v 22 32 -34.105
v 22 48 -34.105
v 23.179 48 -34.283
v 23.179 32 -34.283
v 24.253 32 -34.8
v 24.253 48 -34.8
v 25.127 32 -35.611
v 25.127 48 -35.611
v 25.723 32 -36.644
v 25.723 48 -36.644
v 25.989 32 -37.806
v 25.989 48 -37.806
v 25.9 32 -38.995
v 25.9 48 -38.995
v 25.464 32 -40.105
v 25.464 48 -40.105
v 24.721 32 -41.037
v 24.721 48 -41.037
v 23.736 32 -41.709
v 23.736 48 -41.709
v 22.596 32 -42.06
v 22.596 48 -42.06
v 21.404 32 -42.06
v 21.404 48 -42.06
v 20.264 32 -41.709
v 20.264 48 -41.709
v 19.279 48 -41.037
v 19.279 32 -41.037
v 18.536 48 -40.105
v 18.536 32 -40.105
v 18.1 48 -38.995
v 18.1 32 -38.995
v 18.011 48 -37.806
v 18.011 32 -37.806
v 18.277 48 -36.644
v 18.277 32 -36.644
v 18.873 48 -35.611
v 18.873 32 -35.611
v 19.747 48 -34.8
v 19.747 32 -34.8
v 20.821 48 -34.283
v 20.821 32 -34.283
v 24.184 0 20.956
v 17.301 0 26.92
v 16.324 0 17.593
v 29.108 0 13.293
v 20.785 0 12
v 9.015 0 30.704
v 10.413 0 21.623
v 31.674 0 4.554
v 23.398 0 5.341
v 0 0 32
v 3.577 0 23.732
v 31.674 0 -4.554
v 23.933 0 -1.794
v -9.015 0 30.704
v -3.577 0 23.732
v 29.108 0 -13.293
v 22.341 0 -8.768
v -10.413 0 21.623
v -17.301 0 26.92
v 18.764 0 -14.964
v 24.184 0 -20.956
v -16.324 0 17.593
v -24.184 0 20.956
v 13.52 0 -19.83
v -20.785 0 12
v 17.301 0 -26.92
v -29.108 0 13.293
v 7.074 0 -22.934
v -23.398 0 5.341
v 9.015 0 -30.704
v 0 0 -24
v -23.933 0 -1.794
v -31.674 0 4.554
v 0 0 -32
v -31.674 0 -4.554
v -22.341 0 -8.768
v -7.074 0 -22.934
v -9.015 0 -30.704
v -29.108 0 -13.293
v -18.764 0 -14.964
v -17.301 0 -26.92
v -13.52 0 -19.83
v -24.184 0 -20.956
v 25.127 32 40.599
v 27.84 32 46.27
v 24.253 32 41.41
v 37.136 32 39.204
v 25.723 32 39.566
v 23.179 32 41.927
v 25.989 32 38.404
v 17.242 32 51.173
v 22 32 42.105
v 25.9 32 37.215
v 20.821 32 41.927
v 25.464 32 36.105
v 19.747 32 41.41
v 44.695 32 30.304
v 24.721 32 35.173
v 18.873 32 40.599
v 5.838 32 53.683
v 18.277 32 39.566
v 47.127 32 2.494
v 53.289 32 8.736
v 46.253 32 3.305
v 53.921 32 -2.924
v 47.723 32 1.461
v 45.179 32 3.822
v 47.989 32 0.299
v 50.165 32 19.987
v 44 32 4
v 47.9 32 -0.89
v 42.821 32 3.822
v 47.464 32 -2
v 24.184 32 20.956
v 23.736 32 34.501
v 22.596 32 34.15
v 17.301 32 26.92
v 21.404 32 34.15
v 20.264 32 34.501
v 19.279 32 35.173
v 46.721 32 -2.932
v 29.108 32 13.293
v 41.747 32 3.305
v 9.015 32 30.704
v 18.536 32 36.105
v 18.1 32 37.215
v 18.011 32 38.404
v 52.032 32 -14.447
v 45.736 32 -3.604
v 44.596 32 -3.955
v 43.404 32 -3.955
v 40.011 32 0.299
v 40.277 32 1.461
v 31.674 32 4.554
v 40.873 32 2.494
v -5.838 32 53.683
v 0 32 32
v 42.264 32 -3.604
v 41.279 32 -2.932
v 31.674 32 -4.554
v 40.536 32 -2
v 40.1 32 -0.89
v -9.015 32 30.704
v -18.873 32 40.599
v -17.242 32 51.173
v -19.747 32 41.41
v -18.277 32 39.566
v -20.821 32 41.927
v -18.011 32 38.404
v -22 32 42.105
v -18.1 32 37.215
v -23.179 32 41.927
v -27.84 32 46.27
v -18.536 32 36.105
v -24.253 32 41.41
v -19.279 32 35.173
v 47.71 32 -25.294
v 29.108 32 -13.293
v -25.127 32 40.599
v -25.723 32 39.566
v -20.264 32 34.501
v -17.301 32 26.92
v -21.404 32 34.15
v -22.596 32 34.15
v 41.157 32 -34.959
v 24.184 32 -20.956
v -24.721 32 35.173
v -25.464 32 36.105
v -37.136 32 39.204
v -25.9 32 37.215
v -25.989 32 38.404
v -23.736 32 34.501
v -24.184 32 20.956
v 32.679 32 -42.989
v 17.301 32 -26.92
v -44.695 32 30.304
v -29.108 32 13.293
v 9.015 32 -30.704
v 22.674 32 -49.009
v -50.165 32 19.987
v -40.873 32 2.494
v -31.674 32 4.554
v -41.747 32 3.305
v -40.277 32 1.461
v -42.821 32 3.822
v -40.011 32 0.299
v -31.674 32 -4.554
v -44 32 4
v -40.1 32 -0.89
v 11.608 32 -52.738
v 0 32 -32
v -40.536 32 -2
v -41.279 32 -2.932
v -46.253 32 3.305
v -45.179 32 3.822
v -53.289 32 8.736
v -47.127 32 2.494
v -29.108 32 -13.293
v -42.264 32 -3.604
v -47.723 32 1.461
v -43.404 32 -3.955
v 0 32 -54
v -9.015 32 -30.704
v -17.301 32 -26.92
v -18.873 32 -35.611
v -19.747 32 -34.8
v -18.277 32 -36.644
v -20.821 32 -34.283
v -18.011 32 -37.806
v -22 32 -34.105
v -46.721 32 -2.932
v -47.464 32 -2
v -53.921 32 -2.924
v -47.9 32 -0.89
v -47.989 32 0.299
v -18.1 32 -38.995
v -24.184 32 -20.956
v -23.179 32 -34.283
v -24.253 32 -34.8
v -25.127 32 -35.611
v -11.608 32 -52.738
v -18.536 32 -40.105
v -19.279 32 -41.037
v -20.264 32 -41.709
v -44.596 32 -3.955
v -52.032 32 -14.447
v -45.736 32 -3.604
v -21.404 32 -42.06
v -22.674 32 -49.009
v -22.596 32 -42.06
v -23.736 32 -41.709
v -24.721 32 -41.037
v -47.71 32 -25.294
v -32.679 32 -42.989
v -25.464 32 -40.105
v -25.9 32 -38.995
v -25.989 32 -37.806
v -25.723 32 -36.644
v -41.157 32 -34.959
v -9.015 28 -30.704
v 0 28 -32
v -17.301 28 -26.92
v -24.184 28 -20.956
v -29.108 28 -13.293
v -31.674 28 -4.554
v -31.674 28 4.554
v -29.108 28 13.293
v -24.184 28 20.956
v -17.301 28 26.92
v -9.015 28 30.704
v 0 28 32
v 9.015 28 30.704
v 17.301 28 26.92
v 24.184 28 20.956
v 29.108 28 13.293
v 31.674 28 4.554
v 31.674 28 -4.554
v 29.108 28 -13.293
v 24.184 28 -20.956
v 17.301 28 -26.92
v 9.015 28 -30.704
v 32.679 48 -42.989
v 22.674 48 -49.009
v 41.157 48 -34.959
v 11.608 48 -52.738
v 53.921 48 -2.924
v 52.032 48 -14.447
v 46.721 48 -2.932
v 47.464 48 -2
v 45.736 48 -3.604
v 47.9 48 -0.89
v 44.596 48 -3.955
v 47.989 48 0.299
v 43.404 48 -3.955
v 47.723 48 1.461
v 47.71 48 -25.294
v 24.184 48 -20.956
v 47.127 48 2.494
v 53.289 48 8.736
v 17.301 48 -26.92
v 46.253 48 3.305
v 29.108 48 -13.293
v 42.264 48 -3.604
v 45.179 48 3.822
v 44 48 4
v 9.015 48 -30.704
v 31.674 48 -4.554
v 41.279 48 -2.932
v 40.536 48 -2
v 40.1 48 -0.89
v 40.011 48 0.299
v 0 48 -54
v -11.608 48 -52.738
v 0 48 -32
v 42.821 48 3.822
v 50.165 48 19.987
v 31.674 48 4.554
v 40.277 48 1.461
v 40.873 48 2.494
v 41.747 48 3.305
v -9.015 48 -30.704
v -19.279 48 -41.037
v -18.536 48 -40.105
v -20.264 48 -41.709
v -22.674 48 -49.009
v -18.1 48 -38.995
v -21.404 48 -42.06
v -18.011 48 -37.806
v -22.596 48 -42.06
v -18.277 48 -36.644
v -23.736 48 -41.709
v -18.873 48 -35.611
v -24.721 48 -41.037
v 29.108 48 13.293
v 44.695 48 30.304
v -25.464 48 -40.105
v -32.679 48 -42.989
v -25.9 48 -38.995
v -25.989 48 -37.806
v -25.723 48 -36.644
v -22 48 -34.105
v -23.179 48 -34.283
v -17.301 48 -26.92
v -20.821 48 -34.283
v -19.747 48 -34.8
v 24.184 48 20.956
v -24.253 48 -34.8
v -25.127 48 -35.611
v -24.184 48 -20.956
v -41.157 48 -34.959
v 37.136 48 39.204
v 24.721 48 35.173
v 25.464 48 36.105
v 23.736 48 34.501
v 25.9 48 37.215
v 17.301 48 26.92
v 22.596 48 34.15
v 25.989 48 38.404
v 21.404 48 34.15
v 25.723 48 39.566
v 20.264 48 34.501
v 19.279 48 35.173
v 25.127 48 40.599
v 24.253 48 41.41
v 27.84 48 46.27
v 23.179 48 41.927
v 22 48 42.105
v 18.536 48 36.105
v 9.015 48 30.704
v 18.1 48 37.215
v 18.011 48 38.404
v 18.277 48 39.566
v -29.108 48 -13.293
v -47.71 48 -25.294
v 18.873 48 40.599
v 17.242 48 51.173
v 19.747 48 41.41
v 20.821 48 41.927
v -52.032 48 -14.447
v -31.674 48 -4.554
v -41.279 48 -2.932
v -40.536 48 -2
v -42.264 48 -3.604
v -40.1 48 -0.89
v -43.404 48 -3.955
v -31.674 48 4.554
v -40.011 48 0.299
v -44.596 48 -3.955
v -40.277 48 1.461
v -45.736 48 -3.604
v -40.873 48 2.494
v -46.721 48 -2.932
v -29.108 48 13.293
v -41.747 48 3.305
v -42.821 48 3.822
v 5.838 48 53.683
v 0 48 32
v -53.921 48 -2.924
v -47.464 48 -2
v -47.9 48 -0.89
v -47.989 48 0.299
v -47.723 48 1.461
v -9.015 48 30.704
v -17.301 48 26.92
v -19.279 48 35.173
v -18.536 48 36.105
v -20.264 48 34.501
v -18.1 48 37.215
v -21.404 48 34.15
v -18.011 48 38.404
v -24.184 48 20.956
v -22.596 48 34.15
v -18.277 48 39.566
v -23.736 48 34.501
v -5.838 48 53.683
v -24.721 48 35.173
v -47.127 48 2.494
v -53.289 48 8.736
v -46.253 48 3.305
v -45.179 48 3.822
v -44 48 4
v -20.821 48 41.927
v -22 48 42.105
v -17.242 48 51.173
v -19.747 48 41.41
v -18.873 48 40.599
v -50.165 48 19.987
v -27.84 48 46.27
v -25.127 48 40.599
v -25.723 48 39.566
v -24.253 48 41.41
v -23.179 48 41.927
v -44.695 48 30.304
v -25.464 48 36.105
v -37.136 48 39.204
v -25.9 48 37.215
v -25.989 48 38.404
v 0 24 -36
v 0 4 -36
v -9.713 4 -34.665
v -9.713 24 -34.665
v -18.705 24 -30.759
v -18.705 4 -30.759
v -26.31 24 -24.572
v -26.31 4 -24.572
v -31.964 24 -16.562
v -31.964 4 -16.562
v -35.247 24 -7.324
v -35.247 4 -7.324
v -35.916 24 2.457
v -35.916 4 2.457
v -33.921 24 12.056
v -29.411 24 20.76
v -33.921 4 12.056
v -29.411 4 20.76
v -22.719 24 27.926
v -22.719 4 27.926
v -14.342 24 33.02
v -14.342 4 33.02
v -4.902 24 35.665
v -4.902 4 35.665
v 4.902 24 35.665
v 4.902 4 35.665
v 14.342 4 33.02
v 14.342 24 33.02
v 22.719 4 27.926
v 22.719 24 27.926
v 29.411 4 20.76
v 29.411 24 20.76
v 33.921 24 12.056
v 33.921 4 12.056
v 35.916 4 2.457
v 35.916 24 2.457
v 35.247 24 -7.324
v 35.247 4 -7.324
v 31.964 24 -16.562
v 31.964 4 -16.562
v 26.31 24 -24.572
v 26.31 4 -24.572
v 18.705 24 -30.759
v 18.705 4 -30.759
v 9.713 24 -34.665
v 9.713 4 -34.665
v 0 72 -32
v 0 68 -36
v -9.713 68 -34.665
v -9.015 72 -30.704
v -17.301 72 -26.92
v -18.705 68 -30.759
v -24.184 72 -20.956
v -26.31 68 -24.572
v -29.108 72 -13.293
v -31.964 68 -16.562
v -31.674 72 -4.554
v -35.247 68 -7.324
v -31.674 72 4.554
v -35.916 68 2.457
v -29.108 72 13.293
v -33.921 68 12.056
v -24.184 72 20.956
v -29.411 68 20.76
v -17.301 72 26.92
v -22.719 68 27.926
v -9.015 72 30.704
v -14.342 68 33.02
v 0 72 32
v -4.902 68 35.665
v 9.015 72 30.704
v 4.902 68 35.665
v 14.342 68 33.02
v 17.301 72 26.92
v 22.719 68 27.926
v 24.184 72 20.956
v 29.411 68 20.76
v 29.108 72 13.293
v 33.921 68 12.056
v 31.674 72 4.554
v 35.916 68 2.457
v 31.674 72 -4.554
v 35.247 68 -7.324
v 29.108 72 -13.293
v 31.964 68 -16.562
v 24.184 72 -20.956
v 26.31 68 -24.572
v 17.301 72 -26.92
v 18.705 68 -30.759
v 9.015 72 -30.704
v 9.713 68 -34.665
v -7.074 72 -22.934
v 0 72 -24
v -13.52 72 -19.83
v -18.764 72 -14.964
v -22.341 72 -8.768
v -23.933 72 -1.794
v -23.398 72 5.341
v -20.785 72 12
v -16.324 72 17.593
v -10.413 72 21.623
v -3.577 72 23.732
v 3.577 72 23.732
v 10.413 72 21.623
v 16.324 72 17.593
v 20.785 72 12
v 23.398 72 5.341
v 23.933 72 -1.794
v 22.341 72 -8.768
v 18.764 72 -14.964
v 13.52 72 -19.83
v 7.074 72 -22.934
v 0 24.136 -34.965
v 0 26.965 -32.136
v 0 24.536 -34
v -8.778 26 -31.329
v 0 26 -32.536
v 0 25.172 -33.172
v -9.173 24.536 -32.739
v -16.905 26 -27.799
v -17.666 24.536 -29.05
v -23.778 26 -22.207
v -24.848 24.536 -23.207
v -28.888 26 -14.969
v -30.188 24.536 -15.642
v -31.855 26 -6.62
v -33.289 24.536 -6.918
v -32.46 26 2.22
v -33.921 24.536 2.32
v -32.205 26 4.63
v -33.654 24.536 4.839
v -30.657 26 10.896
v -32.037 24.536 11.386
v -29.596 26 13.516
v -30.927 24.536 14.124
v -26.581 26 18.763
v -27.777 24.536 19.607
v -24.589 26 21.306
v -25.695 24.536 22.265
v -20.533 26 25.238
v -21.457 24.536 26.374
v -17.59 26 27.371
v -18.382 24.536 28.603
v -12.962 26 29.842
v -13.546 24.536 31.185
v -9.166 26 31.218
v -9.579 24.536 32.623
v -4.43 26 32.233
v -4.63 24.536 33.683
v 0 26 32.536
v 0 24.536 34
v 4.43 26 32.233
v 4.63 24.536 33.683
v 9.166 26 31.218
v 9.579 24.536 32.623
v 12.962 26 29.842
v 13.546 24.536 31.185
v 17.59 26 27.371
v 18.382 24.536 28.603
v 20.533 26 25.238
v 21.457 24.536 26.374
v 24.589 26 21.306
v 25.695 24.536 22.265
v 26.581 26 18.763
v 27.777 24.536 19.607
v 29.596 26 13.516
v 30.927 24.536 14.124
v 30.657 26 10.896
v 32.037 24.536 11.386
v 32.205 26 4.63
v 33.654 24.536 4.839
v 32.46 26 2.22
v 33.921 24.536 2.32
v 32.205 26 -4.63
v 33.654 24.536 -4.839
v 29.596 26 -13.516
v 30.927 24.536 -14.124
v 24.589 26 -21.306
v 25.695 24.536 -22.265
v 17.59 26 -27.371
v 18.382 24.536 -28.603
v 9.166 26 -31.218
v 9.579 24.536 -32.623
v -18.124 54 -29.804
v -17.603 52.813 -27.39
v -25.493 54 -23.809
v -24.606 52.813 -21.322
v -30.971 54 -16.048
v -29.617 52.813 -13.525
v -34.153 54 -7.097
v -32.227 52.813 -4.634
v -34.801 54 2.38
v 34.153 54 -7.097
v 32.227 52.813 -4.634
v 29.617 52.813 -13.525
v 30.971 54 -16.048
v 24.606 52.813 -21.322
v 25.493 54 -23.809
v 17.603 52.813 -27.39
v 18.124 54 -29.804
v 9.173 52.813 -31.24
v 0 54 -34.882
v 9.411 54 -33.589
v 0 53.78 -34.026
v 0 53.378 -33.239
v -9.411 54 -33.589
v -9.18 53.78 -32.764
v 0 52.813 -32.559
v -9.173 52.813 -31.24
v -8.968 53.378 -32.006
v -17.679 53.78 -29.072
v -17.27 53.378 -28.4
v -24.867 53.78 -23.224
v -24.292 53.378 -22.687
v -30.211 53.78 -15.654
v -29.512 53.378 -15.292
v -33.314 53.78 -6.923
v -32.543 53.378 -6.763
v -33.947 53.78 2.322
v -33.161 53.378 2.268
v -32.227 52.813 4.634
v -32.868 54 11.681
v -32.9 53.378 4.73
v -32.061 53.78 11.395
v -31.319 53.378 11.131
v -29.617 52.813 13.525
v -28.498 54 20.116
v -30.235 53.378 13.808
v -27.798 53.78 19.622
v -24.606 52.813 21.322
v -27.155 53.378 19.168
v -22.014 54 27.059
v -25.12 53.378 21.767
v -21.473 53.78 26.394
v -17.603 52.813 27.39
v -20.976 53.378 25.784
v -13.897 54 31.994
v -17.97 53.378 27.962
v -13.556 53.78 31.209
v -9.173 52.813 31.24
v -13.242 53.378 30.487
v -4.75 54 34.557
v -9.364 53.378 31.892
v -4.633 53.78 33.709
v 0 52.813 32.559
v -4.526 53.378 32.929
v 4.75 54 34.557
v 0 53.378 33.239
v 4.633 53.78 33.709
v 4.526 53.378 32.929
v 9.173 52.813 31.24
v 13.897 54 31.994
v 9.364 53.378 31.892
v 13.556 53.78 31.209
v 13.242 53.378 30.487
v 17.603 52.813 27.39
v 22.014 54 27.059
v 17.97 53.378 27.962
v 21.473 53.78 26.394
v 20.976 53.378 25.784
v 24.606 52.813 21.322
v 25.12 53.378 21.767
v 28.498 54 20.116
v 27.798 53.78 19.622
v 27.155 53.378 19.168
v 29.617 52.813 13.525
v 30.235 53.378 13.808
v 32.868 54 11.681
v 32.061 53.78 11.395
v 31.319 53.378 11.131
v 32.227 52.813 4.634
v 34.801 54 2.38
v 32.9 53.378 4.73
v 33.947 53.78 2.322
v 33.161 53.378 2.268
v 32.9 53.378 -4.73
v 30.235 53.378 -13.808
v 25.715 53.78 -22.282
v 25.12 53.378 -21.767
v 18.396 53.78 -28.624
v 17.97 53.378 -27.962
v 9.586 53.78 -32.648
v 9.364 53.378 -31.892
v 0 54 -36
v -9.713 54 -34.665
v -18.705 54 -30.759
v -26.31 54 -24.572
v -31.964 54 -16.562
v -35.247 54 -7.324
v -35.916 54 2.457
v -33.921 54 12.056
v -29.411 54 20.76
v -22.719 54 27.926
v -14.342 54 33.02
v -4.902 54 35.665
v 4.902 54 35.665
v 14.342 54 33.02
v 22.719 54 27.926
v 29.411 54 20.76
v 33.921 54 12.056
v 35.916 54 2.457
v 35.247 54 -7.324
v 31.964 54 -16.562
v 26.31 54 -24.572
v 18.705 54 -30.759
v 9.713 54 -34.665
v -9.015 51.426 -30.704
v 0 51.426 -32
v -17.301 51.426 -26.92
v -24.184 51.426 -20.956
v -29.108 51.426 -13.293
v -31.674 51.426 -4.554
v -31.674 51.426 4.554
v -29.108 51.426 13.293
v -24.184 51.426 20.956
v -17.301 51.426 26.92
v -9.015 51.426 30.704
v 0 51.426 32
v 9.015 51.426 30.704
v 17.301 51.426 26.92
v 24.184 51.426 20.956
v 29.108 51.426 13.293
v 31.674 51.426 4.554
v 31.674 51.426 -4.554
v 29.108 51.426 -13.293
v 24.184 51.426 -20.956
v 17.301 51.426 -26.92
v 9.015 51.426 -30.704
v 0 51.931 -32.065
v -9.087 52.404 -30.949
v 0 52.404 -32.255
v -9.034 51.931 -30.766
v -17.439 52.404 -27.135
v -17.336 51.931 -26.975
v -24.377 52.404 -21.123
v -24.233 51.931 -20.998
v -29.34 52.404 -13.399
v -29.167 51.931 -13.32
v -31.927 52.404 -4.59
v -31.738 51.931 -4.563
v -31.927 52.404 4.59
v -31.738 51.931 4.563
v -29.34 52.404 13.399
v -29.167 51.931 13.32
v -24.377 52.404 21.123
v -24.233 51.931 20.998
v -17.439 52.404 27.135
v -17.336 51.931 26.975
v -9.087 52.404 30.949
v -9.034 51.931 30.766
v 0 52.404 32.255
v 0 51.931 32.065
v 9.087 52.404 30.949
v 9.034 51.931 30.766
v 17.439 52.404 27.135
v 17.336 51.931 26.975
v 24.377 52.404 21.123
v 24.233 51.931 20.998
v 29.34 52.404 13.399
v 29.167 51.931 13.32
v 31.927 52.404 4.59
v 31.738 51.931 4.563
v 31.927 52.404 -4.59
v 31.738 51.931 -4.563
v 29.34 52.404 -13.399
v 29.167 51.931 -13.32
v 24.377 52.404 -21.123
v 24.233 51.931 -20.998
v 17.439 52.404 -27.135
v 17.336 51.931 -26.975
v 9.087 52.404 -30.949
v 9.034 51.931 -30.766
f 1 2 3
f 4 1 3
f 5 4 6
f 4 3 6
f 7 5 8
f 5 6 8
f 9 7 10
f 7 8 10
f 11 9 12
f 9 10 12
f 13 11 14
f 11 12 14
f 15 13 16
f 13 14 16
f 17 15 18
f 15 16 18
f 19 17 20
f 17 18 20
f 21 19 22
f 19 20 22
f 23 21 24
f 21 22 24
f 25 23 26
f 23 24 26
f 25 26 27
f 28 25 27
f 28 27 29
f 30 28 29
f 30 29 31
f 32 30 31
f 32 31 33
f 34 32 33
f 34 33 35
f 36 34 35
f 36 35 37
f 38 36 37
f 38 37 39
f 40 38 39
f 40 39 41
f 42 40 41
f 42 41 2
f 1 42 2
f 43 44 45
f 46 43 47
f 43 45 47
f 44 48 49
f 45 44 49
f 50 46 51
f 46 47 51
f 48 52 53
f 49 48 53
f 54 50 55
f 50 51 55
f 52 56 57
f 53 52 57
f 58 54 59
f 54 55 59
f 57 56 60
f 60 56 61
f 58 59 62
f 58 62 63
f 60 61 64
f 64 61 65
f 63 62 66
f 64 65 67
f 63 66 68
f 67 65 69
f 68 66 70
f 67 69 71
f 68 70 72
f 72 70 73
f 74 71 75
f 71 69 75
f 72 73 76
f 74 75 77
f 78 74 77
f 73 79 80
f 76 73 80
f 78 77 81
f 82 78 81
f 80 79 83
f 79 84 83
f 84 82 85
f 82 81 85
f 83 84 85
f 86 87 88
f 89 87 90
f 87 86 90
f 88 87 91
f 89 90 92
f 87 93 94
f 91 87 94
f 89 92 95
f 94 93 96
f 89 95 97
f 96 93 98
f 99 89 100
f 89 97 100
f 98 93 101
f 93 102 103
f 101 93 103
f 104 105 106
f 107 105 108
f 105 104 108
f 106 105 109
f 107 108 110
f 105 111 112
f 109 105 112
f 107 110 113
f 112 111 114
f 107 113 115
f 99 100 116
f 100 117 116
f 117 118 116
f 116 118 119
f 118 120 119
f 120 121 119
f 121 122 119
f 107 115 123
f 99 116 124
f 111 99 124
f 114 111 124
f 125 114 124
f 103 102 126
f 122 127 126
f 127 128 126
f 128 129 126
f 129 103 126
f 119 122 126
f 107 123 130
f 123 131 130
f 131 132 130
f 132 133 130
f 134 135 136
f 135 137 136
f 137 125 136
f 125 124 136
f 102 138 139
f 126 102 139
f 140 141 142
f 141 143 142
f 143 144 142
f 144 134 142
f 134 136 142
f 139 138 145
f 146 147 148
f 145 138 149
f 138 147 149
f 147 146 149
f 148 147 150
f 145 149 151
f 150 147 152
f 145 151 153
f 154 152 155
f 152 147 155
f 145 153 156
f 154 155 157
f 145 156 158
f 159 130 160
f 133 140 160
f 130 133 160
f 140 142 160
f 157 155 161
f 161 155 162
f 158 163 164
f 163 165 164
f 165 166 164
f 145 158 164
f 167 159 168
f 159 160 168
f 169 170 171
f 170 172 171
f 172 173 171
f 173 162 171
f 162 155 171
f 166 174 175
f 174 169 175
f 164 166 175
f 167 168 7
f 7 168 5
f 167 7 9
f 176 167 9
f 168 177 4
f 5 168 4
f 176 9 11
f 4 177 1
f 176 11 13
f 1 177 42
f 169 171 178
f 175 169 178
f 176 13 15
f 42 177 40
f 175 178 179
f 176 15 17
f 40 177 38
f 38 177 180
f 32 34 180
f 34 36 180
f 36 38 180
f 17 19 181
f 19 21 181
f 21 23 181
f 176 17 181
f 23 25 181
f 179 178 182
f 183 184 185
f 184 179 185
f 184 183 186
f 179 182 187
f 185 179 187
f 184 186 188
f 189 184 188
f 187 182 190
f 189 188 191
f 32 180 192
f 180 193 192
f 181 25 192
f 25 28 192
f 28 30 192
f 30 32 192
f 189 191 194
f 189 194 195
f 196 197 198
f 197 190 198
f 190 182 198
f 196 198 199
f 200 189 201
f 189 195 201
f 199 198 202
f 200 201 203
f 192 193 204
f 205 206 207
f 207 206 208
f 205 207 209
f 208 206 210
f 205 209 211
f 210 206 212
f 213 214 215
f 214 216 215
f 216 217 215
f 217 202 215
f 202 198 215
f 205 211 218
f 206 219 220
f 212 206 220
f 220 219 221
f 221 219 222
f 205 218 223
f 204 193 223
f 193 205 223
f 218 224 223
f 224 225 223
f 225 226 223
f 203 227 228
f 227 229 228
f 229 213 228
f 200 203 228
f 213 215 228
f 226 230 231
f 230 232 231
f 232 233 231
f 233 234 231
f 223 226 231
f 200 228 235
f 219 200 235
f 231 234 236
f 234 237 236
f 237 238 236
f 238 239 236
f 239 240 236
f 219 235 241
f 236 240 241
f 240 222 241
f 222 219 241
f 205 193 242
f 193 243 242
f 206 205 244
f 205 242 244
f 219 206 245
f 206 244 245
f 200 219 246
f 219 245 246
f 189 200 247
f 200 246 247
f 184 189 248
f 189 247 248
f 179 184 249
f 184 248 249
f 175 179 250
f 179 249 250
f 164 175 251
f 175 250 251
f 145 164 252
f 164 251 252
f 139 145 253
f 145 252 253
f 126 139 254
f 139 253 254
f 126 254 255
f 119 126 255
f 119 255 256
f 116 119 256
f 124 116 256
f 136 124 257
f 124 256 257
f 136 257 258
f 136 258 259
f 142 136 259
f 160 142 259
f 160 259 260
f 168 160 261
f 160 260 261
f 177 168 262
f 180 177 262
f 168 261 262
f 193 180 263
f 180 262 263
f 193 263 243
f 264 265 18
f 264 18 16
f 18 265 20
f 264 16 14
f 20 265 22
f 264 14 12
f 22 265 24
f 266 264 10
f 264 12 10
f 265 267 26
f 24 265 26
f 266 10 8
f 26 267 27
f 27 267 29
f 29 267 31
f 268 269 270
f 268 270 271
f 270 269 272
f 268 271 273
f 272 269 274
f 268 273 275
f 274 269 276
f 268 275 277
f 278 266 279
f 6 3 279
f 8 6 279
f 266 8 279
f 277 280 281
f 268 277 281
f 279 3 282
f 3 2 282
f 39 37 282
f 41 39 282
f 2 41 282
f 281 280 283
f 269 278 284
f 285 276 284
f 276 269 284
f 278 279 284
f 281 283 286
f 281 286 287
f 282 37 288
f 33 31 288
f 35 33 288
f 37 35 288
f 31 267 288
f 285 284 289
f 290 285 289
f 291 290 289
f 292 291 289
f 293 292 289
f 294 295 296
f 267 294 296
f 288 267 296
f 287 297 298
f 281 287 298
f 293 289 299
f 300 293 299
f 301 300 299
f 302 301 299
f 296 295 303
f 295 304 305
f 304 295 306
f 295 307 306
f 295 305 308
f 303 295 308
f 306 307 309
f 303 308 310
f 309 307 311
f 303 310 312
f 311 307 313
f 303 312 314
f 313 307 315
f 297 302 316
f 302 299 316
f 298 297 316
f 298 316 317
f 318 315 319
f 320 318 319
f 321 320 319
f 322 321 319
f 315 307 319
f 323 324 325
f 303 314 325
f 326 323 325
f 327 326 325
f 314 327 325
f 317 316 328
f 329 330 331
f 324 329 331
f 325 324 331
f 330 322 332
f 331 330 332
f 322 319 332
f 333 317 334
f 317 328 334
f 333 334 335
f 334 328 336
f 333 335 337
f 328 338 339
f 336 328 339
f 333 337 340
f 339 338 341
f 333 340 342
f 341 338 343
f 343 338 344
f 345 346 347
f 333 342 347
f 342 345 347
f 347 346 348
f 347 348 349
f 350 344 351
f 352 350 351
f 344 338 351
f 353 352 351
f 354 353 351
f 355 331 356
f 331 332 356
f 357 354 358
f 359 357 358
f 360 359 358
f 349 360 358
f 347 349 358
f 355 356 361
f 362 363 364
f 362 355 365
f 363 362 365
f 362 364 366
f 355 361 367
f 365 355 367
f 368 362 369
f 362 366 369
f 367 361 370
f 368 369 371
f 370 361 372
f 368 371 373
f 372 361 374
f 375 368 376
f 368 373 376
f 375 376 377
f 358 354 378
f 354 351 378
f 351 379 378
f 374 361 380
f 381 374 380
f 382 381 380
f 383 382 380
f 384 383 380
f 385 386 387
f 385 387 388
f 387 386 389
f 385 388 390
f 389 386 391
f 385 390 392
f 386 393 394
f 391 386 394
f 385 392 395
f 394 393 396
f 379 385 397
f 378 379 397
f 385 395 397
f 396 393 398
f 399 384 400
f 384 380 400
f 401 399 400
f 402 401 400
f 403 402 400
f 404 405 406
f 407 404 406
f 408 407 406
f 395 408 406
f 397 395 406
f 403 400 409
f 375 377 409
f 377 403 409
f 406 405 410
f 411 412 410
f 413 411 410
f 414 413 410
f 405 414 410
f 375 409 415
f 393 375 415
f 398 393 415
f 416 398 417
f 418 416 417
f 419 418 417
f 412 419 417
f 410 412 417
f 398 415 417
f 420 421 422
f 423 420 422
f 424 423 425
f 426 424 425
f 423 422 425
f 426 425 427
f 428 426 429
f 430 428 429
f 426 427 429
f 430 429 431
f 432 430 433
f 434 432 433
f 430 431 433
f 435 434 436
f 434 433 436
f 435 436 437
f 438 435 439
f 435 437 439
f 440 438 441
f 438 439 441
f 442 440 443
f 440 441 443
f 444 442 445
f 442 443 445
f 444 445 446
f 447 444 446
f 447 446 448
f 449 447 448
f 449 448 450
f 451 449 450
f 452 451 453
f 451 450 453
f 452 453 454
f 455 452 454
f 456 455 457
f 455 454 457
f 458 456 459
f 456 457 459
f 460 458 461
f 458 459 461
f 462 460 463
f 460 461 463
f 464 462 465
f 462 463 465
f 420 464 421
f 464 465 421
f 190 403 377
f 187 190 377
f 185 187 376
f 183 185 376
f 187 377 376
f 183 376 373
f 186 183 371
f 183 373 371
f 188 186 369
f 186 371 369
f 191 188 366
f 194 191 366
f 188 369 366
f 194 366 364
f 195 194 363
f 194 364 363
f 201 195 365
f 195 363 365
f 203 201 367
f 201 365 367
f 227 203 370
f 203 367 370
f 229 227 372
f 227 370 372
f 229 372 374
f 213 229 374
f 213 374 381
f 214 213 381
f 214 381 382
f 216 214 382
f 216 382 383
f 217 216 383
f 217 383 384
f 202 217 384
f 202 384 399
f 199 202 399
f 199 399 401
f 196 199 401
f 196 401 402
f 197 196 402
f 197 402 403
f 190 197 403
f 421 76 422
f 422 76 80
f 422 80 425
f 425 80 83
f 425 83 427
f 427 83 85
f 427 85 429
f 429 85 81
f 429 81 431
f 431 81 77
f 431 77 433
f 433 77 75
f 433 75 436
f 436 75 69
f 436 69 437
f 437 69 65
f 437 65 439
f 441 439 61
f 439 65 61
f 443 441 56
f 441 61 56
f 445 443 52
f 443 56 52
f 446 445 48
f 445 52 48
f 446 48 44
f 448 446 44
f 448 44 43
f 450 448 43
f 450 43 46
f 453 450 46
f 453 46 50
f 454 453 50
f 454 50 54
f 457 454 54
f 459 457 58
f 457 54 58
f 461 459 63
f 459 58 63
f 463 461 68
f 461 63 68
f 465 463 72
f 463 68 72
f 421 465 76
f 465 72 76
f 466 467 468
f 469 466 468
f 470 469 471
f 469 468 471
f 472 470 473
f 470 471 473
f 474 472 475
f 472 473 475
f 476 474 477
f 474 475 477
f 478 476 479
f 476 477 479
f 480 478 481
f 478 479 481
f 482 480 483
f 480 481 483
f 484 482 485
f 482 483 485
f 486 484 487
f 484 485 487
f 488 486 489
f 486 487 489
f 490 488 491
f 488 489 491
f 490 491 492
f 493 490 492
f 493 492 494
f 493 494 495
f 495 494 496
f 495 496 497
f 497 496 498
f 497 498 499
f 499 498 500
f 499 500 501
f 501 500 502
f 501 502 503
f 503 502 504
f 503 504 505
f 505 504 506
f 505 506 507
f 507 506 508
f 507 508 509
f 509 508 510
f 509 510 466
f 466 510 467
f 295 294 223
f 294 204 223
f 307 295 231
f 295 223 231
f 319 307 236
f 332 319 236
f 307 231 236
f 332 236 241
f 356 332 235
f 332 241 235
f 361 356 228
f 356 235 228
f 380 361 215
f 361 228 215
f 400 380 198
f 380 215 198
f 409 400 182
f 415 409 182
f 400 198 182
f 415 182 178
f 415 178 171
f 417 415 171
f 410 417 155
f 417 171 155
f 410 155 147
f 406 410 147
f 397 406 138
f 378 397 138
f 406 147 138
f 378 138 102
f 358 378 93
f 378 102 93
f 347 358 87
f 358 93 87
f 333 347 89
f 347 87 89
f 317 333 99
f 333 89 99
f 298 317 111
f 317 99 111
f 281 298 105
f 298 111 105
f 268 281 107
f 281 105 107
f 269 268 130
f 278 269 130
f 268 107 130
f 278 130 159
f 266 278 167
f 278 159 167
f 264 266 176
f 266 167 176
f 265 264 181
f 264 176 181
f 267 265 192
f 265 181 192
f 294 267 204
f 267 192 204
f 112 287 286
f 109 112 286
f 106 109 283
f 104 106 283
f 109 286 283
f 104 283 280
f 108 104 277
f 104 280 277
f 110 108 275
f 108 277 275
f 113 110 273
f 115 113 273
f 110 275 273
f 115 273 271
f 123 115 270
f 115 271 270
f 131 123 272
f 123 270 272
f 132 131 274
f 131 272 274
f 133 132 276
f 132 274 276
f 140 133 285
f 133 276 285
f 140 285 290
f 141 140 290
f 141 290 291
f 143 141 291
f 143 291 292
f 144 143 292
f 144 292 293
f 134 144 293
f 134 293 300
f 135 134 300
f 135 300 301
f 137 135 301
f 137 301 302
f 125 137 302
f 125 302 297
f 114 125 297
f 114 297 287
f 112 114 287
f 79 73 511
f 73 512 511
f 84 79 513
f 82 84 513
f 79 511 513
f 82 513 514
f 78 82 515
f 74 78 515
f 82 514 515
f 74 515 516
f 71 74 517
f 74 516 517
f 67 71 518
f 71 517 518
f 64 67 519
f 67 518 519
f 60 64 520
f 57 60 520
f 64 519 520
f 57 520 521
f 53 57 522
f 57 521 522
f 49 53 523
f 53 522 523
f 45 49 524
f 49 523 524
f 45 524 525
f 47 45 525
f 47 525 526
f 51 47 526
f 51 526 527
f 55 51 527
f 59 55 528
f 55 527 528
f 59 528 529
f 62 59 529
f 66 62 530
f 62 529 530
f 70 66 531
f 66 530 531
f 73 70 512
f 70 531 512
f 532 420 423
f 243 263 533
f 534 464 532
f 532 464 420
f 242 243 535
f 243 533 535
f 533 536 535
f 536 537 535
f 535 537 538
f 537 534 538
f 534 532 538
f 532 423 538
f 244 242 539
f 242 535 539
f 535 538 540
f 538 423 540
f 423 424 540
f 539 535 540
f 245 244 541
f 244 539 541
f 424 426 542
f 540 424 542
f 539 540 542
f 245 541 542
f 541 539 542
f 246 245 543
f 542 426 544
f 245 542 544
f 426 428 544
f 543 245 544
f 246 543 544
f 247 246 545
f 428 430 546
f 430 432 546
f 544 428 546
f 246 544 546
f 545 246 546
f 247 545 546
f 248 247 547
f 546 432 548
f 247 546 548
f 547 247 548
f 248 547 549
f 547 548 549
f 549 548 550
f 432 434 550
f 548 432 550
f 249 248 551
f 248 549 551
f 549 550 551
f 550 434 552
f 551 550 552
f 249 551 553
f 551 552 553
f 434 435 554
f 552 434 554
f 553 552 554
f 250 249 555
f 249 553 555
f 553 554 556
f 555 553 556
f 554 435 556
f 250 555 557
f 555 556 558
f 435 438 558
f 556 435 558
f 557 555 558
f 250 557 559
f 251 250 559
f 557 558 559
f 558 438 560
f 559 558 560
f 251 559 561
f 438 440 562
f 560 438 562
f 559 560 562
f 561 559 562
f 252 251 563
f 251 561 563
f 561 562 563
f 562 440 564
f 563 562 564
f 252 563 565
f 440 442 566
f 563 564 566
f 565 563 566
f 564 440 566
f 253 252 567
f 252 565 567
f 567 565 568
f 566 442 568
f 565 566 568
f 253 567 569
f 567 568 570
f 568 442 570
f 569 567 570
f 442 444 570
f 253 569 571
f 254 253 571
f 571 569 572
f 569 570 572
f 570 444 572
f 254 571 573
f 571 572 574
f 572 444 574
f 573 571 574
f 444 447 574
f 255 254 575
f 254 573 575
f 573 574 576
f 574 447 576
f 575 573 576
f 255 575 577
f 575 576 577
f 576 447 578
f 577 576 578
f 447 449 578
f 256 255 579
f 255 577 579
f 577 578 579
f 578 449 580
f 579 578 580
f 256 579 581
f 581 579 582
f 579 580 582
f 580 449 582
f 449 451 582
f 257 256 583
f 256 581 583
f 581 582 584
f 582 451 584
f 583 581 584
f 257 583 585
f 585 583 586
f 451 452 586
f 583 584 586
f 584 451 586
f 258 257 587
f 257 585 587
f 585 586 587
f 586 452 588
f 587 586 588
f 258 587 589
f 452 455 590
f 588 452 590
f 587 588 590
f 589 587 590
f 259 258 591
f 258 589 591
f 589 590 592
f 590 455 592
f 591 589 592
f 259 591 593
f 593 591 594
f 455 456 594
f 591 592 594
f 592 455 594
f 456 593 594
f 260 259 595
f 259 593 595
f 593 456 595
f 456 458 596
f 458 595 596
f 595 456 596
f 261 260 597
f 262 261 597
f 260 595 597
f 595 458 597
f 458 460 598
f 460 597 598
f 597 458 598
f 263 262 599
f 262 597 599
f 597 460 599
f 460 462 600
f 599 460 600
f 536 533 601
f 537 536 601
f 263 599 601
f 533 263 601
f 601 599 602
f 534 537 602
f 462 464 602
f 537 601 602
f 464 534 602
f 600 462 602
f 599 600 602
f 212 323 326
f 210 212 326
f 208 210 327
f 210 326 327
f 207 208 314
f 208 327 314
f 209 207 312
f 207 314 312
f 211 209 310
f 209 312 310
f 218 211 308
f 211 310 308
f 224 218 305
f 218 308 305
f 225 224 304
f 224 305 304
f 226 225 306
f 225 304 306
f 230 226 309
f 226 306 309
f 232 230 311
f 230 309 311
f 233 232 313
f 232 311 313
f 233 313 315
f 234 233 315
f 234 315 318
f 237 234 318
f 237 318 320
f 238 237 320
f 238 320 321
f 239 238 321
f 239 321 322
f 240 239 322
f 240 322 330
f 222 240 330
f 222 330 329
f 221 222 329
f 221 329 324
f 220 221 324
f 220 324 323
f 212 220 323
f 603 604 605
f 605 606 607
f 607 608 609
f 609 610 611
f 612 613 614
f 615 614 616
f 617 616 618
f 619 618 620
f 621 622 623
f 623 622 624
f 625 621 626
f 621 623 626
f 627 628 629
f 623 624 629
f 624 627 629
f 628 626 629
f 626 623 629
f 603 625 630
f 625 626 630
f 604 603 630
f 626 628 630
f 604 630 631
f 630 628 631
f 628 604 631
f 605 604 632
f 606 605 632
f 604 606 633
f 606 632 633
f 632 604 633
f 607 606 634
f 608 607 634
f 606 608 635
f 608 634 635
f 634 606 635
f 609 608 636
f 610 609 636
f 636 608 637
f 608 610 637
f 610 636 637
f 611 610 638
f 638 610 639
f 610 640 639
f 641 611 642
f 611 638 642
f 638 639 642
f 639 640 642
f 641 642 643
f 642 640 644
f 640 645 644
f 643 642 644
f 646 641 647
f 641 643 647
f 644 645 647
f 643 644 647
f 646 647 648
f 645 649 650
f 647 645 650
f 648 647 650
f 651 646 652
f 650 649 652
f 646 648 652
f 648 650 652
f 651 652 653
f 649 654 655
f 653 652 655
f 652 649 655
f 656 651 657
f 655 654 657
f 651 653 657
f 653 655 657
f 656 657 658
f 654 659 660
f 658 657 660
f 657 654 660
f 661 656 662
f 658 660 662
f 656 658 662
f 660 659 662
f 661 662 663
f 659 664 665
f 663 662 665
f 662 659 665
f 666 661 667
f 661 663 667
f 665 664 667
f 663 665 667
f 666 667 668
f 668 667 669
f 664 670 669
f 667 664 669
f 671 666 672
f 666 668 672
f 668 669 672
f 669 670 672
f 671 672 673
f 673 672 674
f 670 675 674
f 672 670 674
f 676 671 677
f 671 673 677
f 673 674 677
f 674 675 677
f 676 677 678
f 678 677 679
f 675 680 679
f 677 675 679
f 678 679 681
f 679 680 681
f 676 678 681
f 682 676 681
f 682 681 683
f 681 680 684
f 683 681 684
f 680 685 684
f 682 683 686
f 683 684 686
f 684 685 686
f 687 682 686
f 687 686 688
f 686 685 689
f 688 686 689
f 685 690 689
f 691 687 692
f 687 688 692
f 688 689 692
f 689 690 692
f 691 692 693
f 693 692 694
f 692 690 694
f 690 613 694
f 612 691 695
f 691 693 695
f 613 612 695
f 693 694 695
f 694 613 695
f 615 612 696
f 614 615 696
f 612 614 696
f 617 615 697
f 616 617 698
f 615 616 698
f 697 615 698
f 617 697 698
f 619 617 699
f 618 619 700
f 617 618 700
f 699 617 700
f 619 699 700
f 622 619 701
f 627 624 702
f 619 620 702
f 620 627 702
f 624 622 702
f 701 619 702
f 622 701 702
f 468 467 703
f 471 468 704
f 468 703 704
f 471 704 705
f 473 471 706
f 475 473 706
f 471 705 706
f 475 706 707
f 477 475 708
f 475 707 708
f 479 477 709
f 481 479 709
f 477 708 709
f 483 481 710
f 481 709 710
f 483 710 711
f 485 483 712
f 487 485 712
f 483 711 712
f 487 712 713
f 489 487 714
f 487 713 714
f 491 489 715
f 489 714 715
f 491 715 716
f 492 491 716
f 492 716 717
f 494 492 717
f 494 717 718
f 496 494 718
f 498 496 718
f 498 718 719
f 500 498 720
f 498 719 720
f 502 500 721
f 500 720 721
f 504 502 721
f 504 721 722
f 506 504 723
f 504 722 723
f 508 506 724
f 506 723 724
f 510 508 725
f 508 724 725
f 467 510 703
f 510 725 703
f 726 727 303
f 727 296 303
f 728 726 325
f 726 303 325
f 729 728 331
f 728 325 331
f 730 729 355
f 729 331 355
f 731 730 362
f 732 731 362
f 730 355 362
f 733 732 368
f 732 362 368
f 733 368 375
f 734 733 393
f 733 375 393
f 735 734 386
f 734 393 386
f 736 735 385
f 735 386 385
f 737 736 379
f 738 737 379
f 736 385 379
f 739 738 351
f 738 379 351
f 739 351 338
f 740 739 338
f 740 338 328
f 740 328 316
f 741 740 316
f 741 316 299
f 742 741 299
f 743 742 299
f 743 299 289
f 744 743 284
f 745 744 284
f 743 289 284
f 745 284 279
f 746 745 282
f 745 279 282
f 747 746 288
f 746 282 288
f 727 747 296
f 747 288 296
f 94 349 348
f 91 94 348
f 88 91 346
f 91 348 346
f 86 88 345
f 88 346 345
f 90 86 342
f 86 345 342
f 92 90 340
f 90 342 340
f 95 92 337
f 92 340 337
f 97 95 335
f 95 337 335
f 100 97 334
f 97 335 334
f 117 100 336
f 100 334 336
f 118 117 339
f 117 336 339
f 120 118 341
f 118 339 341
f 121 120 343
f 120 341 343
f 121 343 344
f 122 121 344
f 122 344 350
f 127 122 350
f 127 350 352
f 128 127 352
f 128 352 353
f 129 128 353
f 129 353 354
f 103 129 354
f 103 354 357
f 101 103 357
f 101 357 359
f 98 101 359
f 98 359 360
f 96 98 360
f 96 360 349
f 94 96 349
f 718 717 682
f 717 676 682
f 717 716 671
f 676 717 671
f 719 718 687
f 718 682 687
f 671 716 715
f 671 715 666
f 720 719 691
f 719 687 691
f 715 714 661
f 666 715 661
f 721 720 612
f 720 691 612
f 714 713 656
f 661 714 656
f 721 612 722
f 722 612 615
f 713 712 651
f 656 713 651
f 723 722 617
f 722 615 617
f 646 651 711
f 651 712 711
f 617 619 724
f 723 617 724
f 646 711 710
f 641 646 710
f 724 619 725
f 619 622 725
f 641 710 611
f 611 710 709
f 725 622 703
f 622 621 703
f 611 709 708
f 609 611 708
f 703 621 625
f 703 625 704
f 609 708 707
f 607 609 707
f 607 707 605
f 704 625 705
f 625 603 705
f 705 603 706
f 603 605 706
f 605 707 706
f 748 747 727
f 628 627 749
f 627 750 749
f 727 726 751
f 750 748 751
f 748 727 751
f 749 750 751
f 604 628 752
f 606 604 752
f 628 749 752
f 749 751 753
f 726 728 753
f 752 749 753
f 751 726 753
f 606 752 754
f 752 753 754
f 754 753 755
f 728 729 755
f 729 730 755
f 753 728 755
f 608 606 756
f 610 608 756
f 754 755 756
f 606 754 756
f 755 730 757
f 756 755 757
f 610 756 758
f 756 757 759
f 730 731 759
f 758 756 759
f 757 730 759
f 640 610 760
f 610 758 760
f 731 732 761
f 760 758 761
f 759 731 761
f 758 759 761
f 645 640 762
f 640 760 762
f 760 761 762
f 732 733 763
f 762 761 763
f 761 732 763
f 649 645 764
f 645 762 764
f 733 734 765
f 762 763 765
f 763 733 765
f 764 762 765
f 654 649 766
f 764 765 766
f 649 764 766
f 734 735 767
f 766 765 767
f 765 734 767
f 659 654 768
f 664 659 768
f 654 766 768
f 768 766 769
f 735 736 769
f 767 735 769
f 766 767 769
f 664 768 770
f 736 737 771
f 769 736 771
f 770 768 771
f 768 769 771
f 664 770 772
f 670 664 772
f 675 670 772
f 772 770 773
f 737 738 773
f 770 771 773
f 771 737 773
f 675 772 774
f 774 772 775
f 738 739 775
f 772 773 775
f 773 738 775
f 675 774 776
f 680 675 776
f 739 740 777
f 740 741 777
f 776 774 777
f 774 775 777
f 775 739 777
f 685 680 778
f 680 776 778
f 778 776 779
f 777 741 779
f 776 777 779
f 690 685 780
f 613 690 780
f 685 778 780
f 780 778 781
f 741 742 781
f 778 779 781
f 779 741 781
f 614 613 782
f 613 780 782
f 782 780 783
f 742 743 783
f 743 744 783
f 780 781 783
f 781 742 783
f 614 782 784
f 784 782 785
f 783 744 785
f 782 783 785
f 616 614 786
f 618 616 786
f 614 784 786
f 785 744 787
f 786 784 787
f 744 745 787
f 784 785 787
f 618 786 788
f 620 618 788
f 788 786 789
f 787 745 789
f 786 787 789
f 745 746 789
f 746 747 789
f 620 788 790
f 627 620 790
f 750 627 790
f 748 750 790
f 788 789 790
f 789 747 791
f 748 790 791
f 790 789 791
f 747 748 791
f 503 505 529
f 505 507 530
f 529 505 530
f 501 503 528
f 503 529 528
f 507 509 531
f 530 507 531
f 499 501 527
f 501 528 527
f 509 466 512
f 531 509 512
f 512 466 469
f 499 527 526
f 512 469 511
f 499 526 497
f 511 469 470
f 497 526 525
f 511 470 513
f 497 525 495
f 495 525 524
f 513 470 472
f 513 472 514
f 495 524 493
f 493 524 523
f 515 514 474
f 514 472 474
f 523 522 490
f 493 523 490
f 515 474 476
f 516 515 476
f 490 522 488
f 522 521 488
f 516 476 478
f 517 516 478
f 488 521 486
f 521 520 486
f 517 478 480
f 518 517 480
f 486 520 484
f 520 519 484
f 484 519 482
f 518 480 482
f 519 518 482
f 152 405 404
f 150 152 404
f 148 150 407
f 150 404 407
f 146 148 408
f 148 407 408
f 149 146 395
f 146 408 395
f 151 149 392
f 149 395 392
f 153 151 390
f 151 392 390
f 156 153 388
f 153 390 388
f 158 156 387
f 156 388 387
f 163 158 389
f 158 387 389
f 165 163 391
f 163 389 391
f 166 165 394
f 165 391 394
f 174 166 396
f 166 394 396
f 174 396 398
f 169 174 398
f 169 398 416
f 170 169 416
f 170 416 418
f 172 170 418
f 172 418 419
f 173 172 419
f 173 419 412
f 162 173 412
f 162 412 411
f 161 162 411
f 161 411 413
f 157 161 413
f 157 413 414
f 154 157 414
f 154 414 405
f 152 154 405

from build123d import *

# Parameters (mm, degrees)
CHAMFER4_SIZE      = 4
CUT_EXTRUDE1_REACH = 92.2
SKETCH3_R          = 4


with BuildPart() as part:
    # Sketch2 → Revolve2 (revolve)
    with BuildSketch(Plane.XY, mode=Mode.PRIVATE) as revolve2_sk:
        with BuildLine():
            Line((-24, 0), (-24, 72))
            Line((-24, 72), (-36, 72))
            Line((-36, 72), (-36, 54))
            Line((-36, 54), (-34.882306768, 54))
            ThreePointArc((-34.882306768, 54), (-33.621047496, 53.601142721), (-32.558846616, 52.812732058))
            ThreePointArc((-32.558846616, 52.812732058), (-32.144965395, 52.173542011), (-32, 51.425981568))
            Line((-32, 51.425981568), (-32, 48))
            Line((-32, 48), (-54, 48))
            Line((-54, 48), (-54, 32))
            Line((-54, 32), (-32, 32))
            Line((-32, 32), (-32, 28))
            ThreePointArc((-32, 28), (-33.171572875, 25.171572875), (-36, 24))
            Line((-36, 24), (-36, 0))
            Line((-36, 0), (-24, 0))
        make_face()
    revolve(revolve2_sk.sketch.rotate(Axis((0, 0, 0), (0, 1, 0)), 270), axis=Axis((0, 0, 0), (0, 1, 0)))

    # Chamfer4
    chamfer4_edges = [part.edges().sort_by_distance(p)[0] for p in [
        (0, 0, 36),
        (0, 72, 36),
    ]]
    chamfer(chamfer4_edges, length=CHAMFER4_SIZE)

    # Sketch3 → Cut-Extrude1 (cut, up to next)
    with BuildSketch(Plane(origin=(0, 48, 0), x_dir=(1, 0, 0), z_dir=(0, 1, 0)), mode=Mode.PRIVATE) as cut_extrude1_sk1:
        with Locations(Location((44, 0, 0), (0, 0, 270))):
            Circle(SKETCH3_R)
    cut_extrude1_tool1 = extrude(cut_extrude1_sk1.sketch, amount=-CUT_EXTRUDE1_REACH, mode=Mode.PRIVATE) & part.part
    # Sketch3 → Cut-Extrude1 (cut, up to next)
    with BuildSketch(Plane(origin=(0, 48, 0), x_dir=(1, 0, 0), z_dir=(0, 1, 0)), mode=Mode.PRIVATE) as cut_extrude1_sk2:
        with Locations(Location((22, -38.105117767, 0), (0, 0, 270))):
            Circle(SKETCH3_R)
    cut_extrude1_tool2 = extrude(cut_extrude1_sk2.sketch, amount=-CUT_EXTRUDE1_REACH, mode=Mode.PRIVATE) & part.part
    # Sketch3 → Cut-Extrude1 (cut, up to next)
    with BuildSketch(Plane(origin=(0, 48, 0), x_dir=(1, 0, 0), z_dir=(0, 1, 0)), mode=Mode.PRIVATE) as cut_extrude1_sk3:
        with Locations(Location((-22, -38.105117767, 0), (0, 0, 270))):
            Circle(SKETCH3_R)
    cut_extrude1_tool3 = extrude(cut_extrude1_sk3.sketch, amount=-CUT_EXTRUDE1_REACH, mode=Mode.PRIVATE) & part.part
    # Sketch3 → Cut-Extrude1 (cut, up to next)
    with BuildSketch(Plane(origin=(0, 48, 0), x_dir=(1, 0, 0), z_dir=(0, 1, 0)), mode=Mode.PRIVATE) as cut_extrude1_sk4:
        with Locations(Location((-44, 0, 0), (0, 0, 270))):
            Circle(SKETCH3_R)
    cut_extrude1_tool4 = extrude(cut_extrude1_sk4.sketch, amount=-CUT_EXTRUDE1_REACH, mode=Mode.PRIVATE) & part.part
    # Sketch3 → Cut-Extrude1 (cut, up to next)
    with BuildSketch(Plane(origin=(0, 48, 0), x_dir=(1, 0, 0), z_dir=(0, 1, 0)), mode=Mode.PRIVATE) as cut_extrude1_sk5:
        with Locations(Location((-22, 38.105117767, 0), (0, 0, 270))):
            Circle(SKETCH3_R)
    cut_extrude1_tool5 = extrude(cut_extrude1_sk5.sketch, amount=-CUT_EXTRUDE1_REACH, mode=Mode.PRIVATE) & part.part
    # Sketch3 → Cut-Extrude1 (cut, up to next)
    with BuildSketch(Plane(origin=(0, 48, 0), x_dir=(1, 0, 0), z_dir=(0, 1, 0)), mode=Mode.PRIVATE) as cut_extrude1_sk6:
        with Locations(Location((22, 38.105117767, 0), (0, 0, 270))):
            Circle(SKETCH3_R)
    cut_extrude1_tool6 = extrude(cut_extrude1_sk6.sketch, amount=-CUT_EXTRUDE1_REACH, mode=Mode.PRIVATE) & part.part
    add(cut_extrude1_tool1.solids().sort_by_distance((44, 48, 0))[0], mode=Mode.SUBTRACT)
    add(cut_extrude1_tool2.solids().sort_by_distance((22, 48, 38.105118))[0], mode=Mode.SUBTRACT)
    add(cut_extrude1_tool3.solids().sort_by_distance((-22, 48, 38.105118))[0], mode=Mode.SUBTRACT)
    add(cut_extrude1_tool4.solids().sort_by_distance((-44, 48, 0))[0], mode=Mode.SUBTRACT)
    add(cut_extrude1_tool5.solids().sort_by_distance((-22, 48, -38.105118))[0], mode=Mode.SUBTRACT)
    add(cut_extrude1_tool6.solids().sort_by_distance((22, 48, -38.105118))[0], mode=Mode.SUBTRACT)


solid = part.part
